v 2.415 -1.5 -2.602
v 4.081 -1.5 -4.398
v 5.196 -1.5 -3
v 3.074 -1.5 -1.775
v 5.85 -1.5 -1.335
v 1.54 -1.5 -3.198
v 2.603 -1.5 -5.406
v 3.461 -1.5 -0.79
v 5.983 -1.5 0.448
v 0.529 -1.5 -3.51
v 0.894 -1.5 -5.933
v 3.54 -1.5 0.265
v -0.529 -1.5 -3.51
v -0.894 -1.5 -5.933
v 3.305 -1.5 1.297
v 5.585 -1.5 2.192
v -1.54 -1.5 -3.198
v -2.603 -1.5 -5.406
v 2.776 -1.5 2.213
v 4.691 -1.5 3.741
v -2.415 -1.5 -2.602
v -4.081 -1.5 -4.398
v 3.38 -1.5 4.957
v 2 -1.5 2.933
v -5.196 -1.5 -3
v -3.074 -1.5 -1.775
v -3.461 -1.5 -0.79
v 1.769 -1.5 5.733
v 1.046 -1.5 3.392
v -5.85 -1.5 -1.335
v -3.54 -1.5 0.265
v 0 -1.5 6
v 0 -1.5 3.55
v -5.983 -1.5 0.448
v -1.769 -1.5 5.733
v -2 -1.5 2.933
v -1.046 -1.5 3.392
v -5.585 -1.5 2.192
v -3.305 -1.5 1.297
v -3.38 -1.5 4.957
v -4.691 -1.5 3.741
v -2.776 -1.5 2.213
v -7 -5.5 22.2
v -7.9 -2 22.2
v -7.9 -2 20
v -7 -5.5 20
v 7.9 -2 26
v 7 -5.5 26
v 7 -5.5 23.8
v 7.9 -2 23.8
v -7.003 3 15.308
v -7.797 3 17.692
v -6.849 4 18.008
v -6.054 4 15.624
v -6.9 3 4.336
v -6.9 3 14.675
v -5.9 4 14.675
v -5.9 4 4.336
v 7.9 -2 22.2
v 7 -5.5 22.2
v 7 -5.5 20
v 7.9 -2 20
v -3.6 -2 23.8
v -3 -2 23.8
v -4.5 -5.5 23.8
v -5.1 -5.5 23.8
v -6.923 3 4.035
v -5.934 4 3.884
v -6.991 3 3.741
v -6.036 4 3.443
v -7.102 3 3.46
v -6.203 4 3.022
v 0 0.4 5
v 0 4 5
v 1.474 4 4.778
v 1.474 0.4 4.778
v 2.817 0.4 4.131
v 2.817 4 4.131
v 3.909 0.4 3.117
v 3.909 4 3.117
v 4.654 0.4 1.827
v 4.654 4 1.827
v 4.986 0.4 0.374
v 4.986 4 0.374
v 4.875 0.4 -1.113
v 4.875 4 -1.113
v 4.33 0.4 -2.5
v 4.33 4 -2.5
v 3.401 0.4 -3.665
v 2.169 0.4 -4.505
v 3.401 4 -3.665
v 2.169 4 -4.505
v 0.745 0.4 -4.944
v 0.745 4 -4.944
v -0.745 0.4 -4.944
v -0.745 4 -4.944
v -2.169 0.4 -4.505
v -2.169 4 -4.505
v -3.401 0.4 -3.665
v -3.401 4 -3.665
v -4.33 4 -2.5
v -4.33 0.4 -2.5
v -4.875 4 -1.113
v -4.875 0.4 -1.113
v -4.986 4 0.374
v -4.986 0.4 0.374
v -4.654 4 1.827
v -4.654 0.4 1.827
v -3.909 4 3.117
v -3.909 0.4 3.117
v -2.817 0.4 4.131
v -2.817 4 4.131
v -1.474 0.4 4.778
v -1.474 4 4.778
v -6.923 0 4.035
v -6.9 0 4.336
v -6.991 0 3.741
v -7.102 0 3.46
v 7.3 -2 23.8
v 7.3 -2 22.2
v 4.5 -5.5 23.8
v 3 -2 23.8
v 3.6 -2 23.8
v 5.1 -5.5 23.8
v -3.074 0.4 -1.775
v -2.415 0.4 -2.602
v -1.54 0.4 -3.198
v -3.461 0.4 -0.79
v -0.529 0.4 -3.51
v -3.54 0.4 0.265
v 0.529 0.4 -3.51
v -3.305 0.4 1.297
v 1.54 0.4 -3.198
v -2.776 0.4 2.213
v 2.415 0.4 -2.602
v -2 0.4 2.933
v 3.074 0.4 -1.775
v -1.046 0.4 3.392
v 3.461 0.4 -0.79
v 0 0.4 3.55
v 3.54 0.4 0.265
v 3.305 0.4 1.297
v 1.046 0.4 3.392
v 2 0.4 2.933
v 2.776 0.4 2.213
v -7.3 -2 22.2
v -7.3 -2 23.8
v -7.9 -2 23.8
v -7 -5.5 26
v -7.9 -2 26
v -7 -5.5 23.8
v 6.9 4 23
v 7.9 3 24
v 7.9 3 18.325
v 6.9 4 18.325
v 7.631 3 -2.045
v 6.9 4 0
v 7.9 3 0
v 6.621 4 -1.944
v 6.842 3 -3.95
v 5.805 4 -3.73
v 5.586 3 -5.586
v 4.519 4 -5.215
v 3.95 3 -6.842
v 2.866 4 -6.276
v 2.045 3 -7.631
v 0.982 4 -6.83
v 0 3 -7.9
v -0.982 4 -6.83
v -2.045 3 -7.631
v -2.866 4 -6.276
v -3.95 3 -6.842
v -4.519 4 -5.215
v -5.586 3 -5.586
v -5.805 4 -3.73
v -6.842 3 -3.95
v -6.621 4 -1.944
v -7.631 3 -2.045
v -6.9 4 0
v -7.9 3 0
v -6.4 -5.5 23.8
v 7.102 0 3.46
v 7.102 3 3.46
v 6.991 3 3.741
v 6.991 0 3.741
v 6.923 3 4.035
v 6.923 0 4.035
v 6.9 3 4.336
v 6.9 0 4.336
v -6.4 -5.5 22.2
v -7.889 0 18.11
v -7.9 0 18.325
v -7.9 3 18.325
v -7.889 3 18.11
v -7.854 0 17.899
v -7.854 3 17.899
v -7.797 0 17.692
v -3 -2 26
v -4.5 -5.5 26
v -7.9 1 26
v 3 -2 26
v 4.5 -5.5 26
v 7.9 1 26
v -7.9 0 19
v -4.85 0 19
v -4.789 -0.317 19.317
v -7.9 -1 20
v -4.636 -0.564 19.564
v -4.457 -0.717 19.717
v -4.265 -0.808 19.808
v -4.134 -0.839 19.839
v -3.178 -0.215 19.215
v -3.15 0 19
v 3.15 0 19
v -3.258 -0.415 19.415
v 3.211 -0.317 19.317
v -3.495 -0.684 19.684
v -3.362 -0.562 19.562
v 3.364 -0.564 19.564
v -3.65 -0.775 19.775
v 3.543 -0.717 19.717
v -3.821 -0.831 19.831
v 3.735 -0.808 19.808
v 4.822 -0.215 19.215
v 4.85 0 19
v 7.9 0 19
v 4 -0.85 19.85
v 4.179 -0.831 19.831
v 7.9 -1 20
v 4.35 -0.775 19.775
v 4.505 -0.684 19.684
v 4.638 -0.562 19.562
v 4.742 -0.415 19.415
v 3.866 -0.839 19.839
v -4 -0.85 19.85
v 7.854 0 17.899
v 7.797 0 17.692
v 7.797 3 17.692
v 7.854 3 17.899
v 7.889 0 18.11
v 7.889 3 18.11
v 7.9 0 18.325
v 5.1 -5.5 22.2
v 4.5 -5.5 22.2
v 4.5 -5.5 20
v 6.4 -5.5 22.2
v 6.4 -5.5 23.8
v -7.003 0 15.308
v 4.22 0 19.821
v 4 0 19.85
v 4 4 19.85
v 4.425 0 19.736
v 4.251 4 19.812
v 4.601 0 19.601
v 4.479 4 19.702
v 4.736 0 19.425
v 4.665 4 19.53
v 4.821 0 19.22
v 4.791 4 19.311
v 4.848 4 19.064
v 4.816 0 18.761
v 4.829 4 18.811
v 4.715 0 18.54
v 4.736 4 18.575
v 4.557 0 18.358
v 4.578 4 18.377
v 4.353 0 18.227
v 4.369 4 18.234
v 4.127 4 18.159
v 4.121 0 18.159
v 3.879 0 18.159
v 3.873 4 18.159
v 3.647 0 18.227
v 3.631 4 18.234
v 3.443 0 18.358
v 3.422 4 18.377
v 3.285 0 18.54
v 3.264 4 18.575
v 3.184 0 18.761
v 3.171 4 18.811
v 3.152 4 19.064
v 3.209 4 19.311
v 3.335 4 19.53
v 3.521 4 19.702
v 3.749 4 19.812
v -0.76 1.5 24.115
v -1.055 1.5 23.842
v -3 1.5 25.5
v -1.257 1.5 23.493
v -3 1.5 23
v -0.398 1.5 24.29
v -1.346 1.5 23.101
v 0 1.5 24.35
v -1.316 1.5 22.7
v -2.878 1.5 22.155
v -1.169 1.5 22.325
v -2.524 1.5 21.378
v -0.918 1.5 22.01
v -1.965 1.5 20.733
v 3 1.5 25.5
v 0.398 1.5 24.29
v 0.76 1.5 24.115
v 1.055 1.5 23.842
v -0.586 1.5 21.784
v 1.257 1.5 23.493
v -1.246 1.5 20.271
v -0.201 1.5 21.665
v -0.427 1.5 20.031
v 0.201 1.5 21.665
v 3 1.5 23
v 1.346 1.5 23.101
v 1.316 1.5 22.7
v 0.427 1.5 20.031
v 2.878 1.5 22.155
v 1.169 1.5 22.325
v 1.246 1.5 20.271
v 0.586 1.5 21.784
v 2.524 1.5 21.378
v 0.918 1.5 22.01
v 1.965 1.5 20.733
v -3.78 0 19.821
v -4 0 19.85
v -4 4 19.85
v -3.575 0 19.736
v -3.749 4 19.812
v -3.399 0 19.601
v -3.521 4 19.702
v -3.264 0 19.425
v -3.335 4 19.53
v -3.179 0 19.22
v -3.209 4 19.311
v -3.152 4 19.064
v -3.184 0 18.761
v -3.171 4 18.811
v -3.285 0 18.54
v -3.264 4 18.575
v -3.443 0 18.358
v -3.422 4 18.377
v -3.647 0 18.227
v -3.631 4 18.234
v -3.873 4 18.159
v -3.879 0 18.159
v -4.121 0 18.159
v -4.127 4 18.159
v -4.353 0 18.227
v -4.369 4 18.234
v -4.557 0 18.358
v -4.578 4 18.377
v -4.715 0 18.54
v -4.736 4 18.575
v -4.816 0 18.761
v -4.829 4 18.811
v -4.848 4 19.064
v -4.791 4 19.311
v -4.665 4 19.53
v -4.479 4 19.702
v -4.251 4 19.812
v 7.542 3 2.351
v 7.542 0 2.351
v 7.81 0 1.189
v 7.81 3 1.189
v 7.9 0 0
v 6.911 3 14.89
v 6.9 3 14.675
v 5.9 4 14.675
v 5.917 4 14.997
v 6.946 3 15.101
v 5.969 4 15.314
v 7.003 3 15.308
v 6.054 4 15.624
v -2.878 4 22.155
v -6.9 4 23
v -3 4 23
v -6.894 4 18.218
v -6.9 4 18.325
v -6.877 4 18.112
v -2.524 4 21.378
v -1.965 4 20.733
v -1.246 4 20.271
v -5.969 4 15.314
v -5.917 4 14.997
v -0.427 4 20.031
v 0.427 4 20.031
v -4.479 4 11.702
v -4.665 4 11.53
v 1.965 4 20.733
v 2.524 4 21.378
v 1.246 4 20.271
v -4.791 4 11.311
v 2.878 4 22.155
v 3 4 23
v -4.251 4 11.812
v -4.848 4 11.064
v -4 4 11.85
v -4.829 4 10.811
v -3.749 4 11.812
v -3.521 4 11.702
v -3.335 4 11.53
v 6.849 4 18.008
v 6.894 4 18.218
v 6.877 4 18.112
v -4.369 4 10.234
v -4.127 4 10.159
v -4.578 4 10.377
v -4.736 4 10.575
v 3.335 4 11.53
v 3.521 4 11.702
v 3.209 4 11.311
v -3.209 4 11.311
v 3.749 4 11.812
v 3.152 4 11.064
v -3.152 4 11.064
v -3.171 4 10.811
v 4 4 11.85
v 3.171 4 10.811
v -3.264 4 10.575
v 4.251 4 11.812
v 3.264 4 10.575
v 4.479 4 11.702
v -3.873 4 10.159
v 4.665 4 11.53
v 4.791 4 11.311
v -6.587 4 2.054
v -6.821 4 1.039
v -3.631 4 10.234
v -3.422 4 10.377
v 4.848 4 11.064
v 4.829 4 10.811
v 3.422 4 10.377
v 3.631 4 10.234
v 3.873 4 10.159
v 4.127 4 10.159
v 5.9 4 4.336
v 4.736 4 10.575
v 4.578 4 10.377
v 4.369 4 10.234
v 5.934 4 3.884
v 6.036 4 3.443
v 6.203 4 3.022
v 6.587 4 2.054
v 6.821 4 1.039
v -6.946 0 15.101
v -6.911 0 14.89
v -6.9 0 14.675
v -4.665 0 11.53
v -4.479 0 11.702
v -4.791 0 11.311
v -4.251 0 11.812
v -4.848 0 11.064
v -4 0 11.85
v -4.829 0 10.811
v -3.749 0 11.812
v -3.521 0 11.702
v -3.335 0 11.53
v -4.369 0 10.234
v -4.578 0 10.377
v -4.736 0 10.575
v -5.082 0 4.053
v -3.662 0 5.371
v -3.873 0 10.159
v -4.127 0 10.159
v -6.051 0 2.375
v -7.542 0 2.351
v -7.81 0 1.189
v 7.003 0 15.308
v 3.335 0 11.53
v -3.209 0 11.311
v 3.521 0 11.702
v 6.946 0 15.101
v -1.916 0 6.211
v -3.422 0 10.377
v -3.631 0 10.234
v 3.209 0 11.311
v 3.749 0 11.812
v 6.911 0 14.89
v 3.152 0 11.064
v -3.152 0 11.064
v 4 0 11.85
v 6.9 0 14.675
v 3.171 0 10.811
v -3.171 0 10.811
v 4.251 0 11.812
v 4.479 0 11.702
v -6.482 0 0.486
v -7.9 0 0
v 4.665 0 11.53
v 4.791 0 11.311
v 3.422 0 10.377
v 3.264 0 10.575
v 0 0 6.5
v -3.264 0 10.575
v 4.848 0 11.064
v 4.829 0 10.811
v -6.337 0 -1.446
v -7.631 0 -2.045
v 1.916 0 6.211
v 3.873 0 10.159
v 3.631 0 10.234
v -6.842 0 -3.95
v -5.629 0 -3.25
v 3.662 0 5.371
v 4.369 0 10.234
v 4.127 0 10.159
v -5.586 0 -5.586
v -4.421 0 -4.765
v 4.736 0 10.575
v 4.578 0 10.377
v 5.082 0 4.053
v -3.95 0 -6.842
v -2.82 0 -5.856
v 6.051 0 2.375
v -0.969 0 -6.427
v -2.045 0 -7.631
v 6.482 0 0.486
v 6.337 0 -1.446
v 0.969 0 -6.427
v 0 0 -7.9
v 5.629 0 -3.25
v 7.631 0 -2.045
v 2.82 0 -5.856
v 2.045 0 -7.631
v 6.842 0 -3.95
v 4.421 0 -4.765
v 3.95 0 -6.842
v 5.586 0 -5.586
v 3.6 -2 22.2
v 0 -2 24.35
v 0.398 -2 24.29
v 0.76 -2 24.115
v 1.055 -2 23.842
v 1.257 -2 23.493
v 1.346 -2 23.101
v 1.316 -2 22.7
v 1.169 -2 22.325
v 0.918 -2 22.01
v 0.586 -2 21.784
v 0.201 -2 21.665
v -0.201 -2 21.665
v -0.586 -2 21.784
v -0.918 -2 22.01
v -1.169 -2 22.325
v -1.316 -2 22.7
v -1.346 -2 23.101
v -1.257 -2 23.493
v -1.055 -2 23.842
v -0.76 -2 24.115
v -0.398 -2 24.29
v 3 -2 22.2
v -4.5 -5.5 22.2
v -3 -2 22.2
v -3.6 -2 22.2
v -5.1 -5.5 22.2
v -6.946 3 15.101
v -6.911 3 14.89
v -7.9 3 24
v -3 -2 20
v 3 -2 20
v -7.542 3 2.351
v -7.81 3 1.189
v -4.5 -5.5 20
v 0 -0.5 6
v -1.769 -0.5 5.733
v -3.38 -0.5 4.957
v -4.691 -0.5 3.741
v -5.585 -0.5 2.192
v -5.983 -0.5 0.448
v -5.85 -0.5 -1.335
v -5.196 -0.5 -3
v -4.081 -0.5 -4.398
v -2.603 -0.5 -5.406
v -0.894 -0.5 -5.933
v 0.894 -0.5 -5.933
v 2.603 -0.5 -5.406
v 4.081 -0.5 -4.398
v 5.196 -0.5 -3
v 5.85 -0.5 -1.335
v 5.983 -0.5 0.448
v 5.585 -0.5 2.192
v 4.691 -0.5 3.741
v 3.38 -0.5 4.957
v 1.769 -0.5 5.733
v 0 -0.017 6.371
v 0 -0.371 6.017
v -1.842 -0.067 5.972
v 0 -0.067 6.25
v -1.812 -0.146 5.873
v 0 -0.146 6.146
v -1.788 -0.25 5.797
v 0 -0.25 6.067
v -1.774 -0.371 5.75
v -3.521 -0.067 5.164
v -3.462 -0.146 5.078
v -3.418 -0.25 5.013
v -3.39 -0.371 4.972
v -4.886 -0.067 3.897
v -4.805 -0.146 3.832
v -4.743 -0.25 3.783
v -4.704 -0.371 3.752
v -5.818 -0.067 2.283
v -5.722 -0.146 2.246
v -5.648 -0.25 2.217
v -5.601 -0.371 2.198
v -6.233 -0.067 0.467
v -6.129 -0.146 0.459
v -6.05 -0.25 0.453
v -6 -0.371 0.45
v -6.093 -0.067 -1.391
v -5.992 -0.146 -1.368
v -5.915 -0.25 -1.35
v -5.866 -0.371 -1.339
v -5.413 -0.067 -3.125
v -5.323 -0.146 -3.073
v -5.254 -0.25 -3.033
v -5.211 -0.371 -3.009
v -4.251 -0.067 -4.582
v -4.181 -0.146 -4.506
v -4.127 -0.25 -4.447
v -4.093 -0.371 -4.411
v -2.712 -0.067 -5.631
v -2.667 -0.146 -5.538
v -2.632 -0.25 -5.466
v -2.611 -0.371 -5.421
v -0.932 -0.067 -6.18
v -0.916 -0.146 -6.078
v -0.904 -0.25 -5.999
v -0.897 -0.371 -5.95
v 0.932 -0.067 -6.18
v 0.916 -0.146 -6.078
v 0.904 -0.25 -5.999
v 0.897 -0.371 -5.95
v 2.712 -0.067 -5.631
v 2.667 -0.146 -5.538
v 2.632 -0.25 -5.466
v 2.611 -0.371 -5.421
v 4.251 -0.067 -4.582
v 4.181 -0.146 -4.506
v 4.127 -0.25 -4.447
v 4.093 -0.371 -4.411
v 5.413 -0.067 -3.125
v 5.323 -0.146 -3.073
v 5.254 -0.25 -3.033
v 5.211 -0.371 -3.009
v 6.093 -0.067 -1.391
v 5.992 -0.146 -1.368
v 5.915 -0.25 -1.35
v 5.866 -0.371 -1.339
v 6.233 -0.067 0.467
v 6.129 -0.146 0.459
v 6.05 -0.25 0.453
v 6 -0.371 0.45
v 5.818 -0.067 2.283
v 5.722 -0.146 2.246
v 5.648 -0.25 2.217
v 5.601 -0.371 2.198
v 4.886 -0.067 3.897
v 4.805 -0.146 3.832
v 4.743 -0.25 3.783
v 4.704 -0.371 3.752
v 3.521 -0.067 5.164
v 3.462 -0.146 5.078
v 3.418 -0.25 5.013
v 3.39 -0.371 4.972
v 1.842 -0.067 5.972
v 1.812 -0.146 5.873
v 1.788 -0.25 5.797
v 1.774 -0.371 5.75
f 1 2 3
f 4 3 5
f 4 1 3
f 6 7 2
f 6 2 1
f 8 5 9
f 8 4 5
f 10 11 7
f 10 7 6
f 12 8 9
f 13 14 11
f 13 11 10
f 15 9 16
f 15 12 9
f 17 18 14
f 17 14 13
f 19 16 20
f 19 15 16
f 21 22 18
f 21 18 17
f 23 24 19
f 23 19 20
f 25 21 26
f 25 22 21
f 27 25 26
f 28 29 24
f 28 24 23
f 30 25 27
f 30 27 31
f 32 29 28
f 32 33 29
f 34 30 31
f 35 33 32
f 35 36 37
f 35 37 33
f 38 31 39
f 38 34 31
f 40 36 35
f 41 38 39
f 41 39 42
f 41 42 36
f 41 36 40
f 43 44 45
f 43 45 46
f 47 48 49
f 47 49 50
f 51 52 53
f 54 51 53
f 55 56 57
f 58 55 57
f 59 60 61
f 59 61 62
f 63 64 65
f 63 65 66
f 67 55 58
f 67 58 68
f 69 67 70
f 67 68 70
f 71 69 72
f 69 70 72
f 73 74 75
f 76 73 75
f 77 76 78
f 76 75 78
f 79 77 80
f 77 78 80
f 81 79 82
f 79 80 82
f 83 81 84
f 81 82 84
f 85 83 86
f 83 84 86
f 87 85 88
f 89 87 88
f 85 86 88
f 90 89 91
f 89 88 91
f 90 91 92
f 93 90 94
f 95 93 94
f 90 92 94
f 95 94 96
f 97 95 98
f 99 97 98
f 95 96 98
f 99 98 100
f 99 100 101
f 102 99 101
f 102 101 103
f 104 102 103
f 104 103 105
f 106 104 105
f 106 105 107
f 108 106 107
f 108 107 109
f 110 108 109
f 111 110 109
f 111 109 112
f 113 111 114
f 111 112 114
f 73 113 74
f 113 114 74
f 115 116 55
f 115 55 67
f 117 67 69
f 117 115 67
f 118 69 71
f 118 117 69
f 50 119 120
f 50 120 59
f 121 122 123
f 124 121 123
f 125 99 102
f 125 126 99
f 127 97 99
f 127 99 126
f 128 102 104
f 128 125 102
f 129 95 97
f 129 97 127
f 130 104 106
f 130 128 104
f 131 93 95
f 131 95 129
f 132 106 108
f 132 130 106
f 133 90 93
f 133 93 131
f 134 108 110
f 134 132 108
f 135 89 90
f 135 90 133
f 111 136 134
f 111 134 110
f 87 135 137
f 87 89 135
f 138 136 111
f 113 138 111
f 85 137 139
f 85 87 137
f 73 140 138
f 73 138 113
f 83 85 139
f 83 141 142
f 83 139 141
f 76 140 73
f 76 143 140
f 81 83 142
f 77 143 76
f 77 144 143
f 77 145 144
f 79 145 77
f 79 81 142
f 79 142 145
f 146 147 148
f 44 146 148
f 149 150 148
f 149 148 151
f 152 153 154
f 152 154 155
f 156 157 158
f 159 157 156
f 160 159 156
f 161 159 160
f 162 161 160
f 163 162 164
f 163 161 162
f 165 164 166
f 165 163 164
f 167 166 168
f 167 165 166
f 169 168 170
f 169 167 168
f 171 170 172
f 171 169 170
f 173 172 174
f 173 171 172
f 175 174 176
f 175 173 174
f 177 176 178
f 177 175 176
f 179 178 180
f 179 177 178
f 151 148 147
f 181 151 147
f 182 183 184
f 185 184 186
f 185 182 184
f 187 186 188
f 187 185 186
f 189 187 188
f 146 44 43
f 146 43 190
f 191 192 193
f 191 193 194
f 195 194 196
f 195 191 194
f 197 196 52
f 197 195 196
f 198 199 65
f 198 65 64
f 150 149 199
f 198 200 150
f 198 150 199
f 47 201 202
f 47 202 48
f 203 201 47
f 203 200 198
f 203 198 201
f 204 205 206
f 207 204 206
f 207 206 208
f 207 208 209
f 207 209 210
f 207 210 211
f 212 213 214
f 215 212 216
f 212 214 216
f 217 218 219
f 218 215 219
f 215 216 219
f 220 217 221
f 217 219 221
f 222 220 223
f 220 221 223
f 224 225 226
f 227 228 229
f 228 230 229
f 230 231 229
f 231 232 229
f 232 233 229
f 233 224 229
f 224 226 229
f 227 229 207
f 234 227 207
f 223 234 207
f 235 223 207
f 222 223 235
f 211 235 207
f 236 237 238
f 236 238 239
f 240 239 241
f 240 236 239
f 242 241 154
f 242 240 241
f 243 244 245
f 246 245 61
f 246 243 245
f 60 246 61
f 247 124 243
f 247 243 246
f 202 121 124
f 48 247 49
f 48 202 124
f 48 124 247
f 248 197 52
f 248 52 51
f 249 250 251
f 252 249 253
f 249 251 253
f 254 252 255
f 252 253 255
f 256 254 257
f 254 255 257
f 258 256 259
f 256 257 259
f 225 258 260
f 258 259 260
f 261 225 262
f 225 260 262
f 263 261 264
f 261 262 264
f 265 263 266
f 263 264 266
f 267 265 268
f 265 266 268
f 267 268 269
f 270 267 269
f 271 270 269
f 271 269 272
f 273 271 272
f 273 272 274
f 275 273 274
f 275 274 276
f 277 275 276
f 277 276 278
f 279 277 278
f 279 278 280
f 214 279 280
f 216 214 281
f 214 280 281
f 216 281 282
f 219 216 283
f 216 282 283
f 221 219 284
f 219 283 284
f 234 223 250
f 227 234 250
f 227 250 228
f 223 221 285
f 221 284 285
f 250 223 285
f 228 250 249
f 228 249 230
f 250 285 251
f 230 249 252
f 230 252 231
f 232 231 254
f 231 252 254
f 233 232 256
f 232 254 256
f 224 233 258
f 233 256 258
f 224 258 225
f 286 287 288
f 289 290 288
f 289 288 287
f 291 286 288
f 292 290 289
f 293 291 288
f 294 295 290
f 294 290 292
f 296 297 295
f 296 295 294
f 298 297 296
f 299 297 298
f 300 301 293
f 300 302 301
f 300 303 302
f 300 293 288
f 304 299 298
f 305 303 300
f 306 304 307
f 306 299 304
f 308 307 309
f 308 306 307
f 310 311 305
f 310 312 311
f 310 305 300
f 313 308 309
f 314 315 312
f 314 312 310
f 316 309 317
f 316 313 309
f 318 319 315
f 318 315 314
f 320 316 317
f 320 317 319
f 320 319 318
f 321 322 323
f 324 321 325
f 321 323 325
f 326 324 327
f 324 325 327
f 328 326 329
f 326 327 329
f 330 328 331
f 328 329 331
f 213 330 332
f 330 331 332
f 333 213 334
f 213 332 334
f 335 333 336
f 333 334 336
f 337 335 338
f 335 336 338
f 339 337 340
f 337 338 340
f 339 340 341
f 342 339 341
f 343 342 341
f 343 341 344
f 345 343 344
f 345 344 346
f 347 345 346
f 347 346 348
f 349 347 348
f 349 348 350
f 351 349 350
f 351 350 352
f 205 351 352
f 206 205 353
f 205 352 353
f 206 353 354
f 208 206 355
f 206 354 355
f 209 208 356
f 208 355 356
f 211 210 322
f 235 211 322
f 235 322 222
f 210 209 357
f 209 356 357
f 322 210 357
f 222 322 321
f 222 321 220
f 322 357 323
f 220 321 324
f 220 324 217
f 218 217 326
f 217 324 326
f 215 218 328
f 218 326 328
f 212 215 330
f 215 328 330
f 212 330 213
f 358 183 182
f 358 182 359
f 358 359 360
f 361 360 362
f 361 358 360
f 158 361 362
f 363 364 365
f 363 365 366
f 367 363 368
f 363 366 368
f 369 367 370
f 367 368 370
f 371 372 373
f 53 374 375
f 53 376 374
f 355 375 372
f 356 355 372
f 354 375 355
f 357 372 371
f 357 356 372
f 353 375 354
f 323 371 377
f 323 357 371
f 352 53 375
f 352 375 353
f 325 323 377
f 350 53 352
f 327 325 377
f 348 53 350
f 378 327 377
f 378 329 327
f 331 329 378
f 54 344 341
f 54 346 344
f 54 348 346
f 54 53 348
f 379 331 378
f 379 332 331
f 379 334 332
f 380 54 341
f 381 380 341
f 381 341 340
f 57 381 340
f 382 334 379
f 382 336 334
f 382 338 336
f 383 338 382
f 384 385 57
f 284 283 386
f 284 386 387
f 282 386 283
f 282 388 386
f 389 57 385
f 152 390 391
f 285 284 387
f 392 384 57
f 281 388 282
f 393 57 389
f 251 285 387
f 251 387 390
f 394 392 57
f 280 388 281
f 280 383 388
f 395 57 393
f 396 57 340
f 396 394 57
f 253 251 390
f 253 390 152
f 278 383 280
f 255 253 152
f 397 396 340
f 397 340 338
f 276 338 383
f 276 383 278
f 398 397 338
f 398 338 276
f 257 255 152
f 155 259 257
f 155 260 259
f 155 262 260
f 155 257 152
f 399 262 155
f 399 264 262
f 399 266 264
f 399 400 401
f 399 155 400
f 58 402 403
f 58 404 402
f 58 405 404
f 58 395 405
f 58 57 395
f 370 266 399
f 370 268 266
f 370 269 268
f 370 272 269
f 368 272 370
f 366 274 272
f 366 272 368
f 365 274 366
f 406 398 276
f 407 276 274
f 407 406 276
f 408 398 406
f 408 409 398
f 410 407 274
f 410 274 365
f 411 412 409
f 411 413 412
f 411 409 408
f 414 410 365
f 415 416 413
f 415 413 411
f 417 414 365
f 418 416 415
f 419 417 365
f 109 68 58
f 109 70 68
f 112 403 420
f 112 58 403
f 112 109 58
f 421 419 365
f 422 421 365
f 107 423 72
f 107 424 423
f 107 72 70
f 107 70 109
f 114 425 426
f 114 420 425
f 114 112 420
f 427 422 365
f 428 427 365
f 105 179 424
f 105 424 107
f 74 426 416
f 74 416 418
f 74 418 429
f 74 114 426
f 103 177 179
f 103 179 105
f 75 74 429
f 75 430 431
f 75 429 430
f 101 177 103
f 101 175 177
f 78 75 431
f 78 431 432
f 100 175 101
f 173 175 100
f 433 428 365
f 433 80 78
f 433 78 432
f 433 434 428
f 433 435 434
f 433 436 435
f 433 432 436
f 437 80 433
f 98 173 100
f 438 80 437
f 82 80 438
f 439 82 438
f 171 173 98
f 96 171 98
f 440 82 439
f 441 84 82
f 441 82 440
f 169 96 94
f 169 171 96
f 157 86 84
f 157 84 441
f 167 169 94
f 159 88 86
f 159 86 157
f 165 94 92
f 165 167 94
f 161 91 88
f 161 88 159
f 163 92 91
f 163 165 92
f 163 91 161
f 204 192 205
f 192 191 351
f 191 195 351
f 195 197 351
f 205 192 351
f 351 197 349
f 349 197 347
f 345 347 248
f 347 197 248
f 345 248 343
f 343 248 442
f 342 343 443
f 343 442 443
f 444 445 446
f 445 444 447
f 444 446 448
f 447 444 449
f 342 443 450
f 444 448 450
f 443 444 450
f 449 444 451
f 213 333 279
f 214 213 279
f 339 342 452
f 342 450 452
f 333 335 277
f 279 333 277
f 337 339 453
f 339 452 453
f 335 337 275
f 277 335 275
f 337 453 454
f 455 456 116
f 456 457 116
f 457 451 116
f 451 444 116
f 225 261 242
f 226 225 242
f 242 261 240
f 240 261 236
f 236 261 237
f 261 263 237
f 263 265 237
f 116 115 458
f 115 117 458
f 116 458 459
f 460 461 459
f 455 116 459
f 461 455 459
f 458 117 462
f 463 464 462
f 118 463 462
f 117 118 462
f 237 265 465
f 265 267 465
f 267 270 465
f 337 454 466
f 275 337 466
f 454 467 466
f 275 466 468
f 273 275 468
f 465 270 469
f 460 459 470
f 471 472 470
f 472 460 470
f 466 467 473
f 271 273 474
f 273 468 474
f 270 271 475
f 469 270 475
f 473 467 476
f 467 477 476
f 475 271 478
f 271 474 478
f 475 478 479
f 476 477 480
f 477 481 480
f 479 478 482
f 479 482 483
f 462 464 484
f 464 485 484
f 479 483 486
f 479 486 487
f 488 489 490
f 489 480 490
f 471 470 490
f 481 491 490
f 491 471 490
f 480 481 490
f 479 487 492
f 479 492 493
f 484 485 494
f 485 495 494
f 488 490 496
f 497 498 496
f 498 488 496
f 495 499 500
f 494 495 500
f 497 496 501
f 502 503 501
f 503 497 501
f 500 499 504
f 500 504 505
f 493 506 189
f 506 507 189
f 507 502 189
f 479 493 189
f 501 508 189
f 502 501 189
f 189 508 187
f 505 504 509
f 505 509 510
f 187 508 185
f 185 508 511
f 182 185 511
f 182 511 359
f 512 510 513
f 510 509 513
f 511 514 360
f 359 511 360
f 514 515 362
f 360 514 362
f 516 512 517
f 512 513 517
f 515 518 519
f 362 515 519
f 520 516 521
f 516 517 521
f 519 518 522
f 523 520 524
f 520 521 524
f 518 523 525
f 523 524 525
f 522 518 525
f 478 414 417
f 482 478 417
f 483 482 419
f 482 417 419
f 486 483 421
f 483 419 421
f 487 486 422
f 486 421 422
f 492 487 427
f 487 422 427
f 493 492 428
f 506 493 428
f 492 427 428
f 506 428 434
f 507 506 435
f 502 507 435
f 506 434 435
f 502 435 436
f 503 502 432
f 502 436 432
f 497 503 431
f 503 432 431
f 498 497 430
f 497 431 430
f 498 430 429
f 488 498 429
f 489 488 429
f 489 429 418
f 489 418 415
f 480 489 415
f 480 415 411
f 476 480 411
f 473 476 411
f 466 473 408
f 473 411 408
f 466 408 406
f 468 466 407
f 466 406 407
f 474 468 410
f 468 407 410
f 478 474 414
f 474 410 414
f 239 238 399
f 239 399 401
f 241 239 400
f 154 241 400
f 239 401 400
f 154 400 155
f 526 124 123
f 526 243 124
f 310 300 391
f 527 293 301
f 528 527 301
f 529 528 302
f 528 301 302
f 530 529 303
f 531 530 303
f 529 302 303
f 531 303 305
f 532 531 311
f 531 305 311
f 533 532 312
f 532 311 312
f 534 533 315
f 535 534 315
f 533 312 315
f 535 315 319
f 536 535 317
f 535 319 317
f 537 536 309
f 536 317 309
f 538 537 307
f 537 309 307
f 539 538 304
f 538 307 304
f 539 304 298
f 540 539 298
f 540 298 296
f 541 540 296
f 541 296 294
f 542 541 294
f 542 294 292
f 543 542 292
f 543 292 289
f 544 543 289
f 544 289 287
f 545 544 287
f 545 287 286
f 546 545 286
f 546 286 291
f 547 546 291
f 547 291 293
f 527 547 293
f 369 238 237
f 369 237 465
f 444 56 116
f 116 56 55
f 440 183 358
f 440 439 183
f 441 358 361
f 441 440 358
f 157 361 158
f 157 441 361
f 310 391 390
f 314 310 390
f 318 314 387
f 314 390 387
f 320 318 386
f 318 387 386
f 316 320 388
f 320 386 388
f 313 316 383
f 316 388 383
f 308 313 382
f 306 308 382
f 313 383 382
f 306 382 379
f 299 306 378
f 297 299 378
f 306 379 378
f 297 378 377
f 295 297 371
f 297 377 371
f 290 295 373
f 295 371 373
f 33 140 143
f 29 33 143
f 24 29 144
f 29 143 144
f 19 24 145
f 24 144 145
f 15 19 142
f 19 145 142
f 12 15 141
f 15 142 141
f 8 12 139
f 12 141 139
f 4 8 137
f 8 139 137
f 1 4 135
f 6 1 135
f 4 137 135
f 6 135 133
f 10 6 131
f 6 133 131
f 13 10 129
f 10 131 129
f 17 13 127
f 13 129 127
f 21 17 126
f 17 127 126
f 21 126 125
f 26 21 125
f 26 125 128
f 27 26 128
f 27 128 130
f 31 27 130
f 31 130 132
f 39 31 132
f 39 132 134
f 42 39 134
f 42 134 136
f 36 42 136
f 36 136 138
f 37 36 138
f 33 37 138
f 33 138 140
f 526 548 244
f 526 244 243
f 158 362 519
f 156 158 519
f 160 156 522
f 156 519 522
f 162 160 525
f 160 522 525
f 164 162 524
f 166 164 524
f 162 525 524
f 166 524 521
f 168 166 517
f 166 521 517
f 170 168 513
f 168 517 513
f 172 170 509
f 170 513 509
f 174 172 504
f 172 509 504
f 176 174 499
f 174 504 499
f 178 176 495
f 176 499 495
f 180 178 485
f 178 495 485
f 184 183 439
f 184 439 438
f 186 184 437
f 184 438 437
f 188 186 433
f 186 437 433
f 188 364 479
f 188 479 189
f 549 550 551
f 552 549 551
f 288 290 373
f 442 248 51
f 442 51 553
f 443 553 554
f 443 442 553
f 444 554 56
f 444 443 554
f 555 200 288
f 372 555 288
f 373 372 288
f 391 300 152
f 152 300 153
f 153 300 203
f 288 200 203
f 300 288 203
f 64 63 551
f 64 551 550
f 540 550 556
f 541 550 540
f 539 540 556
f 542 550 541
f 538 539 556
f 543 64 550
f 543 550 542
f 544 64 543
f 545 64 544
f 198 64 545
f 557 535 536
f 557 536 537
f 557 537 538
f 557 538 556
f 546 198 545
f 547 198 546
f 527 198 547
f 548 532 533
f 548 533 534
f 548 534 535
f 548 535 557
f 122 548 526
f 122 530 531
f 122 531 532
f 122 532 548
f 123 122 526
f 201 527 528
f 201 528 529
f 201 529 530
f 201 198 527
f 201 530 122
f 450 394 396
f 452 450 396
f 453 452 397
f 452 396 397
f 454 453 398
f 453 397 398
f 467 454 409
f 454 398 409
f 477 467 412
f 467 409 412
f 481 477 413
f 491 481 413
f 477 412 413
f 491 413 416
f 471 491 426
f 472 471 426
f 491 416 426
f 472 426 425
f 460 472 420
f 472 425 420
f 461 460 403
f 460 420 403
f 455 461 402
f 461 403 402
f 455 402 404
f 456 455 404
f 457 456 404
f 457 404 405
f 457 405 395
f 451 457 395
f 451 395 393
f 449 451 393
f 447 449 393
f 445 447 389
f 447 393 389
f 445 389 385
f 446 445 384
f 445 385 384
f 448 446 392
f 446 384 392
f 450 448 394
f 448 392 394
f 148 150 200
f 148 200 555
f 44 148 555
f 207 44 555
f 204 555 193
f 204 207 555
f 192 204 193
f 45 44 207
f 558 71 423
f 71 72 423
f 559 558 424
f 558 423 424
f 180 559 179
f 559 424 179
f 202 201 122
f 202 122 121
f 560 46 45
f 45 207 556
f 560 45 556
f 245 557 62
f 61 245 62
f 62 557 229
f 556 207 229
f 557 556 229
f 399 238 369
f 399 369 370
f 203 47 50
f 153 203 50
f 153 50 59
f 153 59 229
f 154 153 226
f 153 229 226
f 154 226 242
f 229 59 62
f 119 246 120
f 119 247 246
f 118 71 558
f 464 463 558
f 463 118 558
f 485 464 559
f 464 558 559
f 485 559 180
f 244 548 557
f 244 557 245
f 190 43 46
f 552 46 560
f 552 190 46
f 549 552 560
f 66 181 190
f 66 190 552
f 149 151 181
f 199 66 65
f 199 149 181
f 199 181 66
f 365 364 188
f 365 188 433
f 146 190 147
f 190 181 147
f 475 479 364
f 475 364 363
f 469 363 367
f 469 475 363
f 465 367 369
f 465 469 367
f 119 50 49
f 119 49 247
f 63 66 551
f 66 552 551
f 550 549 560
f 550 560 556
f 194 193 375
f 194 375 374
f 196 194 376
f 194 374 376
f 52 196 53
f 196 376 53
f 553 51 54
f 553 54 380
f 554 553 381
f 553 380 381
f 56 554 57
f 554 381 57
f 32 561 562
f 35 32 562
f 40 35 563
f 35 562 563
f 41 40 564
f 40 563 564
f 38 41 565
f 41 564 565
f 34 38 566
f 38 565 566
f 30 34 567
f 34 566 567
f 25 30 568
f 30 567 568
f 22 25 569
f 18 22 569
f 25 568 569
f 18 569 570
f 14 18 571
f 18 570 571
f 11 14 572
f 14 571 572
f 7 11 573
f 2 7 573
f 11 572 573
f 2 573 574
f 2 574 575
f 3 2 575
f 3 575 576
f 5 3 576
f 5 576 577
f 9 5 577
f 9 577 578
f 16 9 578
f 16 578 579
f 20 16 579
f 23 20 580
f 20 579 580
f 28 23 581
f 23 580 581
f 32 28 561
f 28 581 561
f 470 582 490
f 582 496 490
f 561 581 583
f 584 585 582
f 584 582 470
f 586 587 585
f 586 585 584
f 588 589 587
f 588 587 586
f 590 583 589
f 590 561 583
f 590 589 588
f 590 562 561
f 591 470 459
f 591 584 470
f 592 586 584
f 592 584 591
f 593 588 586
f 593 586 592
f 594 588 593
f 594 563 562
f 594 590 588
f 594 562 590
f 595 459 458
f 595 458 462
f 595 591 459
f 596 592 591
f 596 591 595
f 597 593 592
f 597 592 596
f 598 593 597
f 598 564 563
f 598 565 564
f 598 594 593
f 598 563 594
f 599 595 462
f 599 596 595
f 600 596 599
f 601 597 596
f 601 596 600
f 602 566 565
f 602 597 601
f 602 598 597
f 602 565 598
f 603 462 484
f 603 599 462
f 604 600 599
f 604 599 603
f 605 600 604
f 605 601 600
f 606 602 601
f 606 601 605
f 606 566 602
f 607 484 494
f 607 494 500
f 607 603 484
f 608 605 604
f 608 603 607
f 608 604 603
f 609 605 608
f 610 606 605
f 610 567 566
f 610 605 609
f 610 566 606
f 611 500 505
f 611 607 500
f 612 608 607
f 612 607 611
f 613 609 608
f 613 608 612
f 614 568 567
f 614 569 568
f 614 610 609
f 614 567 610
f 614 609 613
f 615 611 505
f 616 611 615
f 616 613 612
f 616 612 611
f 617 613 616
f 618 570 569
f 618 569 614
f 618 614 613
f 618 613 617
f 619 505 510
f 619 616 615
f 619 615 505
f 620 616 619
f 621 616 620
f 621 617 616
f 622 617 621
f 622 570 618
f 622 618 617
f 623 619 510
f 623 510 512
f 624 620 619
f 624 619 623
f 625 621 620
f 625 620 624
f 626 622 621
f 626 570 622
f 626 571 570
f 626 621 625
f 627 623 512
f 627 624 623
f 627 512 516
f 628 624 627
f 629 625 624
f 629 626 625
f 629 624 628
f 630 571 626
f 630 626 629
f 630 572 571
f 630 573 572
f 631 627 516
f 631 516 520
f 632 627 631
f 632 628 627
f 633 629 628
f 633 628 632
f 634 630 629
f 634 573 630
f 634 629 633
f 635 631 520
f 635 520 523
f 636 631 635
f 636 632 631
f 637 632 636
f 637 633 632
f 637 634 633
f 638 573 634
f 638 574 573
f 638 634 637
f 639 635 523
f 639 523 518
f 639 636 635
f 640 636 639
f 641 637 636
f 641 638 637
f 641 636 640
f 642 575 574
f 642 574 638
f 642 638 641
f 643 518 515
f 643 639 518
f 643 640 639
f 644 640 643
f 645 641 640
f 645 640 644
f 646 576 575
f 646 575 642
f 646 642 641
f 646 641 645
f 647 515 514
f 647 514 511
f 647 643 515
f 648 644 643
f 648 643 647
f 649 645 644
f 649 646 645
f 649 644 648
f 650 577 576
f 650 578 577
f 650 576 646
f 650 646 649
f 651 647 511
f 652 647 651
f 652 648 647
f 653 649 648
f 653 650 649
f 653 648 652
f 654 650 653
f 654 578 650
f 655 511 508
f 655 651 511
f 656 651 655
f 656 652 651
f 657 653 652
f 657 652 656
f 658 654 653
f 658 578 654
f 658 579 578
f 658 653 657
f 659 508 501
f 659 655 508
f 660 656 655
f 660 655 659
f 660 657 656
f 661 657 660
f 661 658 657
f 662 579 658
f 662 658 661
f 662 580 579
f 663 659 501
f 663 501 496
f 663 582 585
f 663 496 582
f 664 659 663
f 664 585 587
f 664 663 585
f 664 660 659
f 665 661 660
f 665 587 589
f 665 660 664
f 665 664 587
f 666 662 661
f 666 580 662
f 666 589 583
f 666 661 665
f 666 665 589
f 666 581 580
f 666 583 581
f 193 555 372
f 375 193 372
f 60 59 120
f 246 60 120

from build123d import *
from build123d.topology import SkipClean

# Parameters (mm, degrees)
EXTRUDE_1_DEPTH        = 4
EXTRUDE_3_DEPTH        = 6
CHAMFER_1_SIZE         = 3
SKETCH_5_R             = 0.85
CUT_EXTRUDE_1_DEPTH    = 4
PATTERN_LINEAR_1_COUNT = 2
PATTERN_LINEAR_1_PITCH = 8
CUT_EXTRUDE_2_DEPTH    = 2.5
CUT_EXTRUDE_3_REACH    = 30.061
SKETCH_7_R             = 1.35
SKETCH_8_R             = 6
EXTRUDE_4_DEPTH        = 1.5
FILLET_1_R             = 0.5
SKETCH_9_R             = 5
CUT_EXTRUDE_4_DEPTH    = 3.6
SKETCH_10_R            = 3.55
CUT_EXTRUDE_5_DEPTH    = 3.6
CUT_EXTRUDE_6_DEPTH    = 0.8
CUT_EXTRUDE_7_DEPTH    = 29.786455148
FILLET_2_R             = 2
CHAMFER_2_SIZE         = 1


with BuildPart() as part:
    # ｽｹｯﾁ1 → ﾎﾞｽ - 押し出し1 (new body)
    with BuildSketch(Plane(origin=(0, 0, 0), x_dir=(1, 0, 0), z_dir=(0, 1, 0))):
        with BuildLine():
            Line((-7.9, 0), (-7.9, -26))
            Line((-7.9, -26), (7.9, -26))
            Line((7.9, -26), (7.9, 0))
            ThreePointArc((7.9, 0), (0, 7.9), (-7.9, 0))
        make_face()
    extrude(amount=EXTRUDE_1_DEPTH)

    # ｽｹｯﾁ4 → ﾎﾞｽ - 押し出し3 (add)
    with BuildSketch(Plane.XY.offset(26)):
        Polygon((-7, -5.5), (-4.5, -5.5), (-3, -2), (3, -2), (4.5, -5.5), (7, -5.5), (7.9, -2), (7.9, 0), (-7.9, 0), (-7.9, -2), align=None)
    extrude(amount=-EXTRUDE_3_DEPTH)

    # 面取り1
    chamfer_1_edges = [part.edges().sort_by_distance(p)[0] for p in [
        (0, 4, 26),
    ]]
    chamfer(chamfer_1_edges, length=CHAMFER_1_SIZE)

    # ｽｹｯﾁ5 → ｶｯﾄ - 押し出し1 (cut)
    with BuildSketch(Plane(origin=(0, 4, 0), x_dir=(1, 0, 0), z_dir=(0, 1, 0))):
        with Locations(Location((-4, -19, 0), (0, 0, 270))):
            Circle(SKETCH_5_R)
        with Locations(Location((4, -19, 0), (0, 0, 270))):
            Circle(SKETCH_5_R)
    cut_extrude_1 = extrude(amount=-CUT_EXTRUDE_1_DEPTH, mode=Mode.SUBTRACT)

    # 直線ﾊﾟﾀｰﾝ1: ｶｯﾄ - 押し出し1 ×2
    with Locations(*[(0, 0, -i * PATTERN_LINEAR_1_PITCH) for i in range(1, PATTERN_LINEAR_1_COUNT)]):
        add(cut_extrude_1, mode=Mode.SUBTRACT)

    # ｽｹｯﾁ6 → ｶｯﾄ - 押し出し2 (cut)
    with BuildSketch(Plane(origin=(0, 4, 0), x_dir=(1, 0, 0), z_dir=(0, 1, 0))):
        with BuildLine():
            Line((-3, -23), (-3, -27))
            Line((-3, -27), (3, -27))
            Line((3, -27), (3, -23))
            ThreePointArc((3, -23), (0, -20), (-3, -23))
        make_face()
    extrude(amount=-CUT_EXTRUDE_2_DEPTH, mode=Mode.SUBTRACT)

    # ｽｹｯﾁ7 → ｶｯﾄ - 押し出し3 (cut, up to next)
    with BuildSketch(Plane(origin=(0, 1.5, 0), x_dir=(1, 0, 0), z_dir=(0, 1, 0)), mode=Mode.PRIVATE) as cut_extrude_3_sk1:
        with Locations(Location((0, -23, 0), (0, 0, 270))):
            Circle(SKETCH_7_R)
    cut_extrude_3_tool1 = extrude(cut_extrude_3_sk1.sketch, amount=-CUT_EXTRUDE_3_REACH, mode=Mode.PRIVATE) & part.part
    add(cut_extrude_3_tool1.solids().sort_by_distance((0, 1.5, 23))[0], mode=Mode.SUBTRACT)

    # ｽｹｯﾁ8 → ﾎﾞｽ - 押し出し4 (add)
    with BuildSketch(Plane.XZ):
        with Locations(Location((0, 0, 0), (0, 0, 90))):
            Circle(SKETCH_8_R)
    extrude(amount=EXTRUDE_4_DEPTH)

    # ﾌｨﾚｯﾄ1
    fillet_1_edges = [part.edges().sort_by_distance(p)[0] for p in [
        (0, 0, -6),
    ]]
    fillet(fillet_1_edges, radius=FILLET_1_R)

    # ｽｹｯﾁ9 → ｶｯﾄ - 押し出し4 (cut)
    with BuildSketch(Plane(origin=(0, 4, 0), x_dir=(1, 0, 0), z_dir=(0, 1, 0))):
        with Locations(Location((0, 0, 0), (0, 0, 270))):
            Circle(SKETCH_9_R)
    extrude(amount=-CUT_EXTRUDE_4_DEPTH, mode=Mode.SUBTRACT)

    # ｽｹｯﾁ10 → ｶｯﾄ - 押し出し5 (cut)
    with BuildSketch(Plane(origin=(0, 0.4, 0), x_dir=(1, 0, 0), z_dir=(0, 1, 0))):
        with Locations(Location((0, 0, 0), (0, 0, 270))):
            Circle(SKETCH_10_R)
    extrude(amount=-CUT_EXTRUDE_5_DEPTH, mode=Mode.SUBTRACT)

    # ｽｹｯﾁ11 → ｶｯﾄ - 押し出し6 (cut, symmetric)
    with BuildSketch(Plane.XY.offset(23)):
        Polygon((3, -2), (4.5, -5.5), (5.1, -5.5), (3.6, -2), align=None)
        Polygon((7.9, -2), (7, -5.5), (6.4, -5.5), (7.3, -2), align=None)
    cut_extrude_6 = extrude(amount=CUT_EXTRUDE_6_DEPTH, both=True, mode=Mode.SUBTRACT)

    # ﾐﾗｰ1: ｶｯﾄ - 押し出し6 across plane
    add(cut_extrude_6.mirror(Plane(origin=(0, 0, 0), x_dir=(0, 0, 1), z_dir=(1, 0, 0))), mode=Mode.SUBTRACT)

    # ｽｹｯﾁ12 → ｶｯﾄ - 押し出し7 (cut, through all)
    with SkipClean():  # the faces are left unmerged after this step: merging them gives an invalid solid
        with BuildSketch(Plane(origin=(0, 4, 0), x_dir=(1, 0, 0), z_dir=(0, 1, 0))):
            with BuildLine():
                Line((-7.9, -18), (-6.9, -15))
                Line((-6.9, -15), (-6.9, -3.847076812))
                ThreePointArc((-6.9, -3.847076812), (-7.645913941, -1.987460691), (-7.9, 0))
                Line((-7.9, 0), (-7.9, -18))
            make_face()
        cut_extrude_7 = extrude(amount=-CUT_EXTRUDE_7_DEPTH, mode=Mode.SUBTRACT)

    # ﾐﾗｰ2: ｶｯﾄ - 押し出し7 across plane
    with SkipClean():  # the faces are left unmerged after this step: merging them gives an invalid solid
        add(cut_extrude_7.mirror(Plane(origin=(0, 0, 0), x_dir=(0, 0, 1), z_dir=(1, 0, 0))), mode=Mode.SUBTRACT)

    # ﾌｨﾚｯﾄ2
    fillet_2_edges = [part.edges().sort_by_distance(p)[0] for p in [
        (-7.9, 2, 18),
        (-6.9, 2, 3.847076812),
        (-6.9, 2, 15),
        (7.9, 2, 18),
        (6.9, 2, 15),
        (6.9, 2, 3.847076812),
    ]]
    fillet(fillet_2_edges, radius=FILLET_2_R)

    # 面取り2
    # the kernel refuses this chamfer: 1 mm, written as the material it adds along each edge
    with BuildSketch(Plane(origin=(7.9, 0, 20), x_dir=(0, 0.02749587661058639, -0.9996219169112968), z_dir=(-1, 0, 0))) as chamfer_2_piece_1_section:
        Polygon((CHAMFER_2_SIZE * 0.999621916911, CHAMFER_2_SIZE * 0.0274958766106), (-CHAMFER_2_SIZE * 0.0274958766106, CHAMFER_2_SIZE * 0.999621916911), (0, 0), align=None)
    chamfer_2_piece_1 = extrude(amount=15.8, mode=Mode.PRIVATE)
    chamfer_2_piece_1 = chamfer_2_piece_1 - Plane(origin=(-4, -0.34097177, 19), x_dir=(0, 0, 1), z_dir=(0, 1, 0)) * Cylinder(0.85, 36, mode=Mode.PRIVATE)
    chamfer_2_piece_1 = chamfer_2_piece_1 - Plane(origin=(4, -0.34097177, 19), x_dir=(0, 0, 1), z_dir=(0, 1, 0)) * Cylinder(0.85, 36, mode=Mode.PRIVATE)
    add(chamfer_2_piece_1)
    # the kernel refuses this chamfer: 1 mm, written as the material it takes off along each edge
    with BuildSketch(Plane(origin=(-7.9, 4, 18.32455532), x_dir=(-0.027495876610586487, -0.9996219169112968, 0), z_dir=(0, 0, 1)), Plane(origin=(7.9, 4, 25.571682988), x_dir=(0.027495876610586487, -0.9996219169112968, 0), z_dir=(0, 0, -1))) as chamfer_2_2_piece_1:
        Polygon((CHAMFER_2_SIZE * 0.999621916911, CHAMFER_2_SIZE * 0.0274958766106), (-CHAMFER_2_SIZE * 0.0274958766106, CHAMFER_2_SIZE * 0.999621916911), (0, 0), align=None)
    extrude(amount=7.247127668, mode=Mode.SUBTRACT)
    with BuildSketch(Plane(origin=(0, 4, 0), x_dir=(1, 0, 0), z_dir=(0, 0, 1))) as chamfer_2_2_piece_2:
        Polygon((7.9, -CHAMFER_2_SIZE), (7.9 - CHAMFER_2_SIZE, 0), (7.9, 0), align=None)
    revolve(axis=Axis((0, 4, 0), (0, 1, 0)), revolution_arc=180, mode=Mode.SUBTRACT)
    with BuildSketch(Plane(origin=(-5.9, 4, 18.32455532), x_dir=(-1, 0, 0), z_dir=(0, 0, 1))) as chamfer_2_2_piece_3:
        Polygon((2, CHAMFER_2_SIZE), (2 - CHAMFER_2_SIZE, 0), (2, 0), align=None)
    revolve(axis=Axis((-5.9, 4, 18.32455532), (0, -1, 0)), revolution_arc=18.434948823, mode=Mode.SUBTRACT)
    with BuildSketch(Plane(origin=(-7.797366596, 4, 17.692099788), x_dir=(-0.026084878905720917, -0.9996219169112968, -0.008694959635240323), z_dir=(0.31622776601683844, 0, -0.9486832980505137))) as chamfer_2_2_piece_4:
        Polygon((CHAMFER_2_SIZE * 0.999621916911, -CHAMFER_2_SIZE * 0.0274958766106), (-CHAMFER_2_SIZE * 0.0274958766106, -CHAMFER_2_SIZE * 0.999621916911), (0, 0), align=None)
    extrude(amount=2.513167019, mode=Mode.SUBTRACT)
    with BuildSketch(Plane(origin=(-8.9, 4, 14.67544468), x_dir=(0.9486832980505138, 0, 0.31622776601683794), z_dir=(-0.31622776601683794, 0, 0.9486832980505138))) as chamfer_2_2_piece_5:
        Polygon((2, -CHAMFER_2_SIZE), (2 + CHAMFER_2_SIZE, 0), (2, 0), align=None)
    revolve(axis=Axis((-8.9, 4, 14.67544468), (0, 1, 0)), revolution_arc=18.434948823, mode=Mode.SUBTRACT)
    with BuildSketch(Plane(origin=(-6.9, 4, 14.67544468), x_dir=(-0.027495876610586487, -0.9996219169112968, 0), z_dir=(0, 0, -1))) as chamfer_2_2_piece_6:
        Polygon((CHAMFER_2_SIZE * 0.999621916911, -CHAMFER_2_SIZE * 0.0274958766106), (-CHAMFER_2_SIZE * 0.0274958766106, -CHAMFER_2_SIZE * 0.999621916911), (0, 0), align=None)
    extrude(amount=10.339548002, mode=Mode.SUBTRACT)
    with BuildSketch(Plane(origin=(-8.9, 4, 4.335896678), x_dir=(1, 0, 0), z_dir=(0, 0, 1))) as chamfer_2_2_piece_7:
        Polygon((2, -CHAMFER_2_SIZE), (2 + CHAMFER_2_SIZE, 0), (2, 0), align=None)
    revolve(axis=Axis((-8.9, 4, 4.335896678), (0, 1, 0)), revolution_arc=25.974390018, mode=Mode.SUBTRACT)
    with BuildSketch(Plane(origin=(8.9, 4, 4.335896678), x_dir=(-0.8989898989898989, 0, -0.43796936138745074), z_dir=(0.43796936138745074, 0, -0.8989898989898989))) as chamfer_2_2_piece_8:
        Polygon((2, -CHAMFER_2_SIZE), (2 + CHAMFER_2_SIZE, 0), (2, 0), align=None)
    revolve(axis=Axis((8.9, 4, 4.335896678), (0, 1, 0)), revolution_arc=25.974390018, mode=Mode.SUBTRACT)
    with BuildSketch(Plane(origin=(6.9, 4, 14.67544468), x_dir=(0.027495876610586487, -0.9996219169112968, 0), z_dir=(0, 0, -1))) as chamfer_2_2_piece_9:
        Polygon((CHAMFER_2_SIZE * 0.999621916911, CHAMFER_2_SIZE * 0.0274958766106), (-CHAMFER_2_SIZE * 0.0274958766106, CHAMFER_2_SIZE * 0.999621916911), (0, 0), align=None)
    extrude(amount=10.339548002, mode=Mode.SUBTRACT)
    with BuildSketch(Plane(origin=(8.9, 4, 14.67544468), x_dir=(-1, 0, 0), z_dir=(0, 0, -1))) as chamfer_2_2_piece_10:
        Polygon((2, -CHAMFER_2_SIZE), (2 + CHAMFER_2_SIZE, 0), (2, 0), align=None)
    revolve(axis=Axis((8.9, 4, 14.67544468), (0, 1, 0)), revolution_arc=18.434948823, mode=Mode.SUBTRACT)
    with BuildSketch(Plane(origin=(7.797366596, 4, 17.692099788), x_dir=(0.026084878905720917, -0.9996219169112968, -0.008694959635240323), z_dir=(-0.31622776601683844, 0, -0.9486832980505137))) as chamfer_2_2_piece_11:
        Polygon((CHAMFER_2_SIZE * 0.999621916911, CHAMFER_2_SIZE * 0.0274958766106), (-CHAMFER_2_SIZE * 0.0274958766106, CHAMFER_2_SIZE * 0.999621916911), (0, 0), align=None)
    extrude(amount=2.513167019, mode=Mode.SUBTRACT)
    with BuildSketch(Plane(origin=(5.9, 4, 18.32455532), x_dir=(0.9486832980505135, 0, -0.3162277660168389), z_dir=(-0.3162277660168389, 0, -0.9486832980505135))) as chamfer_2_2_piece_12:
        Polygon((2, CHAMFER_2_SIZE), (2 - CHAMFER_2_SIZE, 0), (2, 0), align=None)
    revolve(axis=Axis((5.9, 4, 18.32455532), (0, -1, 0)), revolution_arc=18.434948823, mode=Mode.SUBTRACT)
    with BuildSketch(Plane(origin=(0, 4, 0), x_dir=(0.898989898989899, 0, 0.4379693613874505), z_dir=(-0.4379693613874505, 0, 0.898989898989899))) as chamfer_2_2_piece_13:
        Polygon((7.9, -CHAMFER_2_SIZE), (7.9 - CHAMFER_2_SIZE, 0), (7.9, 0), align=None)
    revolve(axis=Axis((0, 4, 0), (0, 1, 0)), revolution_arc=25.974390018, mode=Mode.SUBTRACT)
    with BuildSketch(Plane(origin=(0, 4, 0), x_dir=(-0.898989898989899, 0, 0.4379693613874506), z_dir=(0.4379693613874506, 0, 0.898989898989899))) as chamfer_2_2_piece_14:
        Polygon((7.9, CHAMFER_2_SIZE), (7.9 - CHAMFER_2_SIZE, 0), (7.9, 0), align=None)
    revolve(axis=Axis((0, 4, 0), (0, -1, 0)), revolution_arc=25.974390018, mode=Mode.SUBTRACT)


solid = part.part
